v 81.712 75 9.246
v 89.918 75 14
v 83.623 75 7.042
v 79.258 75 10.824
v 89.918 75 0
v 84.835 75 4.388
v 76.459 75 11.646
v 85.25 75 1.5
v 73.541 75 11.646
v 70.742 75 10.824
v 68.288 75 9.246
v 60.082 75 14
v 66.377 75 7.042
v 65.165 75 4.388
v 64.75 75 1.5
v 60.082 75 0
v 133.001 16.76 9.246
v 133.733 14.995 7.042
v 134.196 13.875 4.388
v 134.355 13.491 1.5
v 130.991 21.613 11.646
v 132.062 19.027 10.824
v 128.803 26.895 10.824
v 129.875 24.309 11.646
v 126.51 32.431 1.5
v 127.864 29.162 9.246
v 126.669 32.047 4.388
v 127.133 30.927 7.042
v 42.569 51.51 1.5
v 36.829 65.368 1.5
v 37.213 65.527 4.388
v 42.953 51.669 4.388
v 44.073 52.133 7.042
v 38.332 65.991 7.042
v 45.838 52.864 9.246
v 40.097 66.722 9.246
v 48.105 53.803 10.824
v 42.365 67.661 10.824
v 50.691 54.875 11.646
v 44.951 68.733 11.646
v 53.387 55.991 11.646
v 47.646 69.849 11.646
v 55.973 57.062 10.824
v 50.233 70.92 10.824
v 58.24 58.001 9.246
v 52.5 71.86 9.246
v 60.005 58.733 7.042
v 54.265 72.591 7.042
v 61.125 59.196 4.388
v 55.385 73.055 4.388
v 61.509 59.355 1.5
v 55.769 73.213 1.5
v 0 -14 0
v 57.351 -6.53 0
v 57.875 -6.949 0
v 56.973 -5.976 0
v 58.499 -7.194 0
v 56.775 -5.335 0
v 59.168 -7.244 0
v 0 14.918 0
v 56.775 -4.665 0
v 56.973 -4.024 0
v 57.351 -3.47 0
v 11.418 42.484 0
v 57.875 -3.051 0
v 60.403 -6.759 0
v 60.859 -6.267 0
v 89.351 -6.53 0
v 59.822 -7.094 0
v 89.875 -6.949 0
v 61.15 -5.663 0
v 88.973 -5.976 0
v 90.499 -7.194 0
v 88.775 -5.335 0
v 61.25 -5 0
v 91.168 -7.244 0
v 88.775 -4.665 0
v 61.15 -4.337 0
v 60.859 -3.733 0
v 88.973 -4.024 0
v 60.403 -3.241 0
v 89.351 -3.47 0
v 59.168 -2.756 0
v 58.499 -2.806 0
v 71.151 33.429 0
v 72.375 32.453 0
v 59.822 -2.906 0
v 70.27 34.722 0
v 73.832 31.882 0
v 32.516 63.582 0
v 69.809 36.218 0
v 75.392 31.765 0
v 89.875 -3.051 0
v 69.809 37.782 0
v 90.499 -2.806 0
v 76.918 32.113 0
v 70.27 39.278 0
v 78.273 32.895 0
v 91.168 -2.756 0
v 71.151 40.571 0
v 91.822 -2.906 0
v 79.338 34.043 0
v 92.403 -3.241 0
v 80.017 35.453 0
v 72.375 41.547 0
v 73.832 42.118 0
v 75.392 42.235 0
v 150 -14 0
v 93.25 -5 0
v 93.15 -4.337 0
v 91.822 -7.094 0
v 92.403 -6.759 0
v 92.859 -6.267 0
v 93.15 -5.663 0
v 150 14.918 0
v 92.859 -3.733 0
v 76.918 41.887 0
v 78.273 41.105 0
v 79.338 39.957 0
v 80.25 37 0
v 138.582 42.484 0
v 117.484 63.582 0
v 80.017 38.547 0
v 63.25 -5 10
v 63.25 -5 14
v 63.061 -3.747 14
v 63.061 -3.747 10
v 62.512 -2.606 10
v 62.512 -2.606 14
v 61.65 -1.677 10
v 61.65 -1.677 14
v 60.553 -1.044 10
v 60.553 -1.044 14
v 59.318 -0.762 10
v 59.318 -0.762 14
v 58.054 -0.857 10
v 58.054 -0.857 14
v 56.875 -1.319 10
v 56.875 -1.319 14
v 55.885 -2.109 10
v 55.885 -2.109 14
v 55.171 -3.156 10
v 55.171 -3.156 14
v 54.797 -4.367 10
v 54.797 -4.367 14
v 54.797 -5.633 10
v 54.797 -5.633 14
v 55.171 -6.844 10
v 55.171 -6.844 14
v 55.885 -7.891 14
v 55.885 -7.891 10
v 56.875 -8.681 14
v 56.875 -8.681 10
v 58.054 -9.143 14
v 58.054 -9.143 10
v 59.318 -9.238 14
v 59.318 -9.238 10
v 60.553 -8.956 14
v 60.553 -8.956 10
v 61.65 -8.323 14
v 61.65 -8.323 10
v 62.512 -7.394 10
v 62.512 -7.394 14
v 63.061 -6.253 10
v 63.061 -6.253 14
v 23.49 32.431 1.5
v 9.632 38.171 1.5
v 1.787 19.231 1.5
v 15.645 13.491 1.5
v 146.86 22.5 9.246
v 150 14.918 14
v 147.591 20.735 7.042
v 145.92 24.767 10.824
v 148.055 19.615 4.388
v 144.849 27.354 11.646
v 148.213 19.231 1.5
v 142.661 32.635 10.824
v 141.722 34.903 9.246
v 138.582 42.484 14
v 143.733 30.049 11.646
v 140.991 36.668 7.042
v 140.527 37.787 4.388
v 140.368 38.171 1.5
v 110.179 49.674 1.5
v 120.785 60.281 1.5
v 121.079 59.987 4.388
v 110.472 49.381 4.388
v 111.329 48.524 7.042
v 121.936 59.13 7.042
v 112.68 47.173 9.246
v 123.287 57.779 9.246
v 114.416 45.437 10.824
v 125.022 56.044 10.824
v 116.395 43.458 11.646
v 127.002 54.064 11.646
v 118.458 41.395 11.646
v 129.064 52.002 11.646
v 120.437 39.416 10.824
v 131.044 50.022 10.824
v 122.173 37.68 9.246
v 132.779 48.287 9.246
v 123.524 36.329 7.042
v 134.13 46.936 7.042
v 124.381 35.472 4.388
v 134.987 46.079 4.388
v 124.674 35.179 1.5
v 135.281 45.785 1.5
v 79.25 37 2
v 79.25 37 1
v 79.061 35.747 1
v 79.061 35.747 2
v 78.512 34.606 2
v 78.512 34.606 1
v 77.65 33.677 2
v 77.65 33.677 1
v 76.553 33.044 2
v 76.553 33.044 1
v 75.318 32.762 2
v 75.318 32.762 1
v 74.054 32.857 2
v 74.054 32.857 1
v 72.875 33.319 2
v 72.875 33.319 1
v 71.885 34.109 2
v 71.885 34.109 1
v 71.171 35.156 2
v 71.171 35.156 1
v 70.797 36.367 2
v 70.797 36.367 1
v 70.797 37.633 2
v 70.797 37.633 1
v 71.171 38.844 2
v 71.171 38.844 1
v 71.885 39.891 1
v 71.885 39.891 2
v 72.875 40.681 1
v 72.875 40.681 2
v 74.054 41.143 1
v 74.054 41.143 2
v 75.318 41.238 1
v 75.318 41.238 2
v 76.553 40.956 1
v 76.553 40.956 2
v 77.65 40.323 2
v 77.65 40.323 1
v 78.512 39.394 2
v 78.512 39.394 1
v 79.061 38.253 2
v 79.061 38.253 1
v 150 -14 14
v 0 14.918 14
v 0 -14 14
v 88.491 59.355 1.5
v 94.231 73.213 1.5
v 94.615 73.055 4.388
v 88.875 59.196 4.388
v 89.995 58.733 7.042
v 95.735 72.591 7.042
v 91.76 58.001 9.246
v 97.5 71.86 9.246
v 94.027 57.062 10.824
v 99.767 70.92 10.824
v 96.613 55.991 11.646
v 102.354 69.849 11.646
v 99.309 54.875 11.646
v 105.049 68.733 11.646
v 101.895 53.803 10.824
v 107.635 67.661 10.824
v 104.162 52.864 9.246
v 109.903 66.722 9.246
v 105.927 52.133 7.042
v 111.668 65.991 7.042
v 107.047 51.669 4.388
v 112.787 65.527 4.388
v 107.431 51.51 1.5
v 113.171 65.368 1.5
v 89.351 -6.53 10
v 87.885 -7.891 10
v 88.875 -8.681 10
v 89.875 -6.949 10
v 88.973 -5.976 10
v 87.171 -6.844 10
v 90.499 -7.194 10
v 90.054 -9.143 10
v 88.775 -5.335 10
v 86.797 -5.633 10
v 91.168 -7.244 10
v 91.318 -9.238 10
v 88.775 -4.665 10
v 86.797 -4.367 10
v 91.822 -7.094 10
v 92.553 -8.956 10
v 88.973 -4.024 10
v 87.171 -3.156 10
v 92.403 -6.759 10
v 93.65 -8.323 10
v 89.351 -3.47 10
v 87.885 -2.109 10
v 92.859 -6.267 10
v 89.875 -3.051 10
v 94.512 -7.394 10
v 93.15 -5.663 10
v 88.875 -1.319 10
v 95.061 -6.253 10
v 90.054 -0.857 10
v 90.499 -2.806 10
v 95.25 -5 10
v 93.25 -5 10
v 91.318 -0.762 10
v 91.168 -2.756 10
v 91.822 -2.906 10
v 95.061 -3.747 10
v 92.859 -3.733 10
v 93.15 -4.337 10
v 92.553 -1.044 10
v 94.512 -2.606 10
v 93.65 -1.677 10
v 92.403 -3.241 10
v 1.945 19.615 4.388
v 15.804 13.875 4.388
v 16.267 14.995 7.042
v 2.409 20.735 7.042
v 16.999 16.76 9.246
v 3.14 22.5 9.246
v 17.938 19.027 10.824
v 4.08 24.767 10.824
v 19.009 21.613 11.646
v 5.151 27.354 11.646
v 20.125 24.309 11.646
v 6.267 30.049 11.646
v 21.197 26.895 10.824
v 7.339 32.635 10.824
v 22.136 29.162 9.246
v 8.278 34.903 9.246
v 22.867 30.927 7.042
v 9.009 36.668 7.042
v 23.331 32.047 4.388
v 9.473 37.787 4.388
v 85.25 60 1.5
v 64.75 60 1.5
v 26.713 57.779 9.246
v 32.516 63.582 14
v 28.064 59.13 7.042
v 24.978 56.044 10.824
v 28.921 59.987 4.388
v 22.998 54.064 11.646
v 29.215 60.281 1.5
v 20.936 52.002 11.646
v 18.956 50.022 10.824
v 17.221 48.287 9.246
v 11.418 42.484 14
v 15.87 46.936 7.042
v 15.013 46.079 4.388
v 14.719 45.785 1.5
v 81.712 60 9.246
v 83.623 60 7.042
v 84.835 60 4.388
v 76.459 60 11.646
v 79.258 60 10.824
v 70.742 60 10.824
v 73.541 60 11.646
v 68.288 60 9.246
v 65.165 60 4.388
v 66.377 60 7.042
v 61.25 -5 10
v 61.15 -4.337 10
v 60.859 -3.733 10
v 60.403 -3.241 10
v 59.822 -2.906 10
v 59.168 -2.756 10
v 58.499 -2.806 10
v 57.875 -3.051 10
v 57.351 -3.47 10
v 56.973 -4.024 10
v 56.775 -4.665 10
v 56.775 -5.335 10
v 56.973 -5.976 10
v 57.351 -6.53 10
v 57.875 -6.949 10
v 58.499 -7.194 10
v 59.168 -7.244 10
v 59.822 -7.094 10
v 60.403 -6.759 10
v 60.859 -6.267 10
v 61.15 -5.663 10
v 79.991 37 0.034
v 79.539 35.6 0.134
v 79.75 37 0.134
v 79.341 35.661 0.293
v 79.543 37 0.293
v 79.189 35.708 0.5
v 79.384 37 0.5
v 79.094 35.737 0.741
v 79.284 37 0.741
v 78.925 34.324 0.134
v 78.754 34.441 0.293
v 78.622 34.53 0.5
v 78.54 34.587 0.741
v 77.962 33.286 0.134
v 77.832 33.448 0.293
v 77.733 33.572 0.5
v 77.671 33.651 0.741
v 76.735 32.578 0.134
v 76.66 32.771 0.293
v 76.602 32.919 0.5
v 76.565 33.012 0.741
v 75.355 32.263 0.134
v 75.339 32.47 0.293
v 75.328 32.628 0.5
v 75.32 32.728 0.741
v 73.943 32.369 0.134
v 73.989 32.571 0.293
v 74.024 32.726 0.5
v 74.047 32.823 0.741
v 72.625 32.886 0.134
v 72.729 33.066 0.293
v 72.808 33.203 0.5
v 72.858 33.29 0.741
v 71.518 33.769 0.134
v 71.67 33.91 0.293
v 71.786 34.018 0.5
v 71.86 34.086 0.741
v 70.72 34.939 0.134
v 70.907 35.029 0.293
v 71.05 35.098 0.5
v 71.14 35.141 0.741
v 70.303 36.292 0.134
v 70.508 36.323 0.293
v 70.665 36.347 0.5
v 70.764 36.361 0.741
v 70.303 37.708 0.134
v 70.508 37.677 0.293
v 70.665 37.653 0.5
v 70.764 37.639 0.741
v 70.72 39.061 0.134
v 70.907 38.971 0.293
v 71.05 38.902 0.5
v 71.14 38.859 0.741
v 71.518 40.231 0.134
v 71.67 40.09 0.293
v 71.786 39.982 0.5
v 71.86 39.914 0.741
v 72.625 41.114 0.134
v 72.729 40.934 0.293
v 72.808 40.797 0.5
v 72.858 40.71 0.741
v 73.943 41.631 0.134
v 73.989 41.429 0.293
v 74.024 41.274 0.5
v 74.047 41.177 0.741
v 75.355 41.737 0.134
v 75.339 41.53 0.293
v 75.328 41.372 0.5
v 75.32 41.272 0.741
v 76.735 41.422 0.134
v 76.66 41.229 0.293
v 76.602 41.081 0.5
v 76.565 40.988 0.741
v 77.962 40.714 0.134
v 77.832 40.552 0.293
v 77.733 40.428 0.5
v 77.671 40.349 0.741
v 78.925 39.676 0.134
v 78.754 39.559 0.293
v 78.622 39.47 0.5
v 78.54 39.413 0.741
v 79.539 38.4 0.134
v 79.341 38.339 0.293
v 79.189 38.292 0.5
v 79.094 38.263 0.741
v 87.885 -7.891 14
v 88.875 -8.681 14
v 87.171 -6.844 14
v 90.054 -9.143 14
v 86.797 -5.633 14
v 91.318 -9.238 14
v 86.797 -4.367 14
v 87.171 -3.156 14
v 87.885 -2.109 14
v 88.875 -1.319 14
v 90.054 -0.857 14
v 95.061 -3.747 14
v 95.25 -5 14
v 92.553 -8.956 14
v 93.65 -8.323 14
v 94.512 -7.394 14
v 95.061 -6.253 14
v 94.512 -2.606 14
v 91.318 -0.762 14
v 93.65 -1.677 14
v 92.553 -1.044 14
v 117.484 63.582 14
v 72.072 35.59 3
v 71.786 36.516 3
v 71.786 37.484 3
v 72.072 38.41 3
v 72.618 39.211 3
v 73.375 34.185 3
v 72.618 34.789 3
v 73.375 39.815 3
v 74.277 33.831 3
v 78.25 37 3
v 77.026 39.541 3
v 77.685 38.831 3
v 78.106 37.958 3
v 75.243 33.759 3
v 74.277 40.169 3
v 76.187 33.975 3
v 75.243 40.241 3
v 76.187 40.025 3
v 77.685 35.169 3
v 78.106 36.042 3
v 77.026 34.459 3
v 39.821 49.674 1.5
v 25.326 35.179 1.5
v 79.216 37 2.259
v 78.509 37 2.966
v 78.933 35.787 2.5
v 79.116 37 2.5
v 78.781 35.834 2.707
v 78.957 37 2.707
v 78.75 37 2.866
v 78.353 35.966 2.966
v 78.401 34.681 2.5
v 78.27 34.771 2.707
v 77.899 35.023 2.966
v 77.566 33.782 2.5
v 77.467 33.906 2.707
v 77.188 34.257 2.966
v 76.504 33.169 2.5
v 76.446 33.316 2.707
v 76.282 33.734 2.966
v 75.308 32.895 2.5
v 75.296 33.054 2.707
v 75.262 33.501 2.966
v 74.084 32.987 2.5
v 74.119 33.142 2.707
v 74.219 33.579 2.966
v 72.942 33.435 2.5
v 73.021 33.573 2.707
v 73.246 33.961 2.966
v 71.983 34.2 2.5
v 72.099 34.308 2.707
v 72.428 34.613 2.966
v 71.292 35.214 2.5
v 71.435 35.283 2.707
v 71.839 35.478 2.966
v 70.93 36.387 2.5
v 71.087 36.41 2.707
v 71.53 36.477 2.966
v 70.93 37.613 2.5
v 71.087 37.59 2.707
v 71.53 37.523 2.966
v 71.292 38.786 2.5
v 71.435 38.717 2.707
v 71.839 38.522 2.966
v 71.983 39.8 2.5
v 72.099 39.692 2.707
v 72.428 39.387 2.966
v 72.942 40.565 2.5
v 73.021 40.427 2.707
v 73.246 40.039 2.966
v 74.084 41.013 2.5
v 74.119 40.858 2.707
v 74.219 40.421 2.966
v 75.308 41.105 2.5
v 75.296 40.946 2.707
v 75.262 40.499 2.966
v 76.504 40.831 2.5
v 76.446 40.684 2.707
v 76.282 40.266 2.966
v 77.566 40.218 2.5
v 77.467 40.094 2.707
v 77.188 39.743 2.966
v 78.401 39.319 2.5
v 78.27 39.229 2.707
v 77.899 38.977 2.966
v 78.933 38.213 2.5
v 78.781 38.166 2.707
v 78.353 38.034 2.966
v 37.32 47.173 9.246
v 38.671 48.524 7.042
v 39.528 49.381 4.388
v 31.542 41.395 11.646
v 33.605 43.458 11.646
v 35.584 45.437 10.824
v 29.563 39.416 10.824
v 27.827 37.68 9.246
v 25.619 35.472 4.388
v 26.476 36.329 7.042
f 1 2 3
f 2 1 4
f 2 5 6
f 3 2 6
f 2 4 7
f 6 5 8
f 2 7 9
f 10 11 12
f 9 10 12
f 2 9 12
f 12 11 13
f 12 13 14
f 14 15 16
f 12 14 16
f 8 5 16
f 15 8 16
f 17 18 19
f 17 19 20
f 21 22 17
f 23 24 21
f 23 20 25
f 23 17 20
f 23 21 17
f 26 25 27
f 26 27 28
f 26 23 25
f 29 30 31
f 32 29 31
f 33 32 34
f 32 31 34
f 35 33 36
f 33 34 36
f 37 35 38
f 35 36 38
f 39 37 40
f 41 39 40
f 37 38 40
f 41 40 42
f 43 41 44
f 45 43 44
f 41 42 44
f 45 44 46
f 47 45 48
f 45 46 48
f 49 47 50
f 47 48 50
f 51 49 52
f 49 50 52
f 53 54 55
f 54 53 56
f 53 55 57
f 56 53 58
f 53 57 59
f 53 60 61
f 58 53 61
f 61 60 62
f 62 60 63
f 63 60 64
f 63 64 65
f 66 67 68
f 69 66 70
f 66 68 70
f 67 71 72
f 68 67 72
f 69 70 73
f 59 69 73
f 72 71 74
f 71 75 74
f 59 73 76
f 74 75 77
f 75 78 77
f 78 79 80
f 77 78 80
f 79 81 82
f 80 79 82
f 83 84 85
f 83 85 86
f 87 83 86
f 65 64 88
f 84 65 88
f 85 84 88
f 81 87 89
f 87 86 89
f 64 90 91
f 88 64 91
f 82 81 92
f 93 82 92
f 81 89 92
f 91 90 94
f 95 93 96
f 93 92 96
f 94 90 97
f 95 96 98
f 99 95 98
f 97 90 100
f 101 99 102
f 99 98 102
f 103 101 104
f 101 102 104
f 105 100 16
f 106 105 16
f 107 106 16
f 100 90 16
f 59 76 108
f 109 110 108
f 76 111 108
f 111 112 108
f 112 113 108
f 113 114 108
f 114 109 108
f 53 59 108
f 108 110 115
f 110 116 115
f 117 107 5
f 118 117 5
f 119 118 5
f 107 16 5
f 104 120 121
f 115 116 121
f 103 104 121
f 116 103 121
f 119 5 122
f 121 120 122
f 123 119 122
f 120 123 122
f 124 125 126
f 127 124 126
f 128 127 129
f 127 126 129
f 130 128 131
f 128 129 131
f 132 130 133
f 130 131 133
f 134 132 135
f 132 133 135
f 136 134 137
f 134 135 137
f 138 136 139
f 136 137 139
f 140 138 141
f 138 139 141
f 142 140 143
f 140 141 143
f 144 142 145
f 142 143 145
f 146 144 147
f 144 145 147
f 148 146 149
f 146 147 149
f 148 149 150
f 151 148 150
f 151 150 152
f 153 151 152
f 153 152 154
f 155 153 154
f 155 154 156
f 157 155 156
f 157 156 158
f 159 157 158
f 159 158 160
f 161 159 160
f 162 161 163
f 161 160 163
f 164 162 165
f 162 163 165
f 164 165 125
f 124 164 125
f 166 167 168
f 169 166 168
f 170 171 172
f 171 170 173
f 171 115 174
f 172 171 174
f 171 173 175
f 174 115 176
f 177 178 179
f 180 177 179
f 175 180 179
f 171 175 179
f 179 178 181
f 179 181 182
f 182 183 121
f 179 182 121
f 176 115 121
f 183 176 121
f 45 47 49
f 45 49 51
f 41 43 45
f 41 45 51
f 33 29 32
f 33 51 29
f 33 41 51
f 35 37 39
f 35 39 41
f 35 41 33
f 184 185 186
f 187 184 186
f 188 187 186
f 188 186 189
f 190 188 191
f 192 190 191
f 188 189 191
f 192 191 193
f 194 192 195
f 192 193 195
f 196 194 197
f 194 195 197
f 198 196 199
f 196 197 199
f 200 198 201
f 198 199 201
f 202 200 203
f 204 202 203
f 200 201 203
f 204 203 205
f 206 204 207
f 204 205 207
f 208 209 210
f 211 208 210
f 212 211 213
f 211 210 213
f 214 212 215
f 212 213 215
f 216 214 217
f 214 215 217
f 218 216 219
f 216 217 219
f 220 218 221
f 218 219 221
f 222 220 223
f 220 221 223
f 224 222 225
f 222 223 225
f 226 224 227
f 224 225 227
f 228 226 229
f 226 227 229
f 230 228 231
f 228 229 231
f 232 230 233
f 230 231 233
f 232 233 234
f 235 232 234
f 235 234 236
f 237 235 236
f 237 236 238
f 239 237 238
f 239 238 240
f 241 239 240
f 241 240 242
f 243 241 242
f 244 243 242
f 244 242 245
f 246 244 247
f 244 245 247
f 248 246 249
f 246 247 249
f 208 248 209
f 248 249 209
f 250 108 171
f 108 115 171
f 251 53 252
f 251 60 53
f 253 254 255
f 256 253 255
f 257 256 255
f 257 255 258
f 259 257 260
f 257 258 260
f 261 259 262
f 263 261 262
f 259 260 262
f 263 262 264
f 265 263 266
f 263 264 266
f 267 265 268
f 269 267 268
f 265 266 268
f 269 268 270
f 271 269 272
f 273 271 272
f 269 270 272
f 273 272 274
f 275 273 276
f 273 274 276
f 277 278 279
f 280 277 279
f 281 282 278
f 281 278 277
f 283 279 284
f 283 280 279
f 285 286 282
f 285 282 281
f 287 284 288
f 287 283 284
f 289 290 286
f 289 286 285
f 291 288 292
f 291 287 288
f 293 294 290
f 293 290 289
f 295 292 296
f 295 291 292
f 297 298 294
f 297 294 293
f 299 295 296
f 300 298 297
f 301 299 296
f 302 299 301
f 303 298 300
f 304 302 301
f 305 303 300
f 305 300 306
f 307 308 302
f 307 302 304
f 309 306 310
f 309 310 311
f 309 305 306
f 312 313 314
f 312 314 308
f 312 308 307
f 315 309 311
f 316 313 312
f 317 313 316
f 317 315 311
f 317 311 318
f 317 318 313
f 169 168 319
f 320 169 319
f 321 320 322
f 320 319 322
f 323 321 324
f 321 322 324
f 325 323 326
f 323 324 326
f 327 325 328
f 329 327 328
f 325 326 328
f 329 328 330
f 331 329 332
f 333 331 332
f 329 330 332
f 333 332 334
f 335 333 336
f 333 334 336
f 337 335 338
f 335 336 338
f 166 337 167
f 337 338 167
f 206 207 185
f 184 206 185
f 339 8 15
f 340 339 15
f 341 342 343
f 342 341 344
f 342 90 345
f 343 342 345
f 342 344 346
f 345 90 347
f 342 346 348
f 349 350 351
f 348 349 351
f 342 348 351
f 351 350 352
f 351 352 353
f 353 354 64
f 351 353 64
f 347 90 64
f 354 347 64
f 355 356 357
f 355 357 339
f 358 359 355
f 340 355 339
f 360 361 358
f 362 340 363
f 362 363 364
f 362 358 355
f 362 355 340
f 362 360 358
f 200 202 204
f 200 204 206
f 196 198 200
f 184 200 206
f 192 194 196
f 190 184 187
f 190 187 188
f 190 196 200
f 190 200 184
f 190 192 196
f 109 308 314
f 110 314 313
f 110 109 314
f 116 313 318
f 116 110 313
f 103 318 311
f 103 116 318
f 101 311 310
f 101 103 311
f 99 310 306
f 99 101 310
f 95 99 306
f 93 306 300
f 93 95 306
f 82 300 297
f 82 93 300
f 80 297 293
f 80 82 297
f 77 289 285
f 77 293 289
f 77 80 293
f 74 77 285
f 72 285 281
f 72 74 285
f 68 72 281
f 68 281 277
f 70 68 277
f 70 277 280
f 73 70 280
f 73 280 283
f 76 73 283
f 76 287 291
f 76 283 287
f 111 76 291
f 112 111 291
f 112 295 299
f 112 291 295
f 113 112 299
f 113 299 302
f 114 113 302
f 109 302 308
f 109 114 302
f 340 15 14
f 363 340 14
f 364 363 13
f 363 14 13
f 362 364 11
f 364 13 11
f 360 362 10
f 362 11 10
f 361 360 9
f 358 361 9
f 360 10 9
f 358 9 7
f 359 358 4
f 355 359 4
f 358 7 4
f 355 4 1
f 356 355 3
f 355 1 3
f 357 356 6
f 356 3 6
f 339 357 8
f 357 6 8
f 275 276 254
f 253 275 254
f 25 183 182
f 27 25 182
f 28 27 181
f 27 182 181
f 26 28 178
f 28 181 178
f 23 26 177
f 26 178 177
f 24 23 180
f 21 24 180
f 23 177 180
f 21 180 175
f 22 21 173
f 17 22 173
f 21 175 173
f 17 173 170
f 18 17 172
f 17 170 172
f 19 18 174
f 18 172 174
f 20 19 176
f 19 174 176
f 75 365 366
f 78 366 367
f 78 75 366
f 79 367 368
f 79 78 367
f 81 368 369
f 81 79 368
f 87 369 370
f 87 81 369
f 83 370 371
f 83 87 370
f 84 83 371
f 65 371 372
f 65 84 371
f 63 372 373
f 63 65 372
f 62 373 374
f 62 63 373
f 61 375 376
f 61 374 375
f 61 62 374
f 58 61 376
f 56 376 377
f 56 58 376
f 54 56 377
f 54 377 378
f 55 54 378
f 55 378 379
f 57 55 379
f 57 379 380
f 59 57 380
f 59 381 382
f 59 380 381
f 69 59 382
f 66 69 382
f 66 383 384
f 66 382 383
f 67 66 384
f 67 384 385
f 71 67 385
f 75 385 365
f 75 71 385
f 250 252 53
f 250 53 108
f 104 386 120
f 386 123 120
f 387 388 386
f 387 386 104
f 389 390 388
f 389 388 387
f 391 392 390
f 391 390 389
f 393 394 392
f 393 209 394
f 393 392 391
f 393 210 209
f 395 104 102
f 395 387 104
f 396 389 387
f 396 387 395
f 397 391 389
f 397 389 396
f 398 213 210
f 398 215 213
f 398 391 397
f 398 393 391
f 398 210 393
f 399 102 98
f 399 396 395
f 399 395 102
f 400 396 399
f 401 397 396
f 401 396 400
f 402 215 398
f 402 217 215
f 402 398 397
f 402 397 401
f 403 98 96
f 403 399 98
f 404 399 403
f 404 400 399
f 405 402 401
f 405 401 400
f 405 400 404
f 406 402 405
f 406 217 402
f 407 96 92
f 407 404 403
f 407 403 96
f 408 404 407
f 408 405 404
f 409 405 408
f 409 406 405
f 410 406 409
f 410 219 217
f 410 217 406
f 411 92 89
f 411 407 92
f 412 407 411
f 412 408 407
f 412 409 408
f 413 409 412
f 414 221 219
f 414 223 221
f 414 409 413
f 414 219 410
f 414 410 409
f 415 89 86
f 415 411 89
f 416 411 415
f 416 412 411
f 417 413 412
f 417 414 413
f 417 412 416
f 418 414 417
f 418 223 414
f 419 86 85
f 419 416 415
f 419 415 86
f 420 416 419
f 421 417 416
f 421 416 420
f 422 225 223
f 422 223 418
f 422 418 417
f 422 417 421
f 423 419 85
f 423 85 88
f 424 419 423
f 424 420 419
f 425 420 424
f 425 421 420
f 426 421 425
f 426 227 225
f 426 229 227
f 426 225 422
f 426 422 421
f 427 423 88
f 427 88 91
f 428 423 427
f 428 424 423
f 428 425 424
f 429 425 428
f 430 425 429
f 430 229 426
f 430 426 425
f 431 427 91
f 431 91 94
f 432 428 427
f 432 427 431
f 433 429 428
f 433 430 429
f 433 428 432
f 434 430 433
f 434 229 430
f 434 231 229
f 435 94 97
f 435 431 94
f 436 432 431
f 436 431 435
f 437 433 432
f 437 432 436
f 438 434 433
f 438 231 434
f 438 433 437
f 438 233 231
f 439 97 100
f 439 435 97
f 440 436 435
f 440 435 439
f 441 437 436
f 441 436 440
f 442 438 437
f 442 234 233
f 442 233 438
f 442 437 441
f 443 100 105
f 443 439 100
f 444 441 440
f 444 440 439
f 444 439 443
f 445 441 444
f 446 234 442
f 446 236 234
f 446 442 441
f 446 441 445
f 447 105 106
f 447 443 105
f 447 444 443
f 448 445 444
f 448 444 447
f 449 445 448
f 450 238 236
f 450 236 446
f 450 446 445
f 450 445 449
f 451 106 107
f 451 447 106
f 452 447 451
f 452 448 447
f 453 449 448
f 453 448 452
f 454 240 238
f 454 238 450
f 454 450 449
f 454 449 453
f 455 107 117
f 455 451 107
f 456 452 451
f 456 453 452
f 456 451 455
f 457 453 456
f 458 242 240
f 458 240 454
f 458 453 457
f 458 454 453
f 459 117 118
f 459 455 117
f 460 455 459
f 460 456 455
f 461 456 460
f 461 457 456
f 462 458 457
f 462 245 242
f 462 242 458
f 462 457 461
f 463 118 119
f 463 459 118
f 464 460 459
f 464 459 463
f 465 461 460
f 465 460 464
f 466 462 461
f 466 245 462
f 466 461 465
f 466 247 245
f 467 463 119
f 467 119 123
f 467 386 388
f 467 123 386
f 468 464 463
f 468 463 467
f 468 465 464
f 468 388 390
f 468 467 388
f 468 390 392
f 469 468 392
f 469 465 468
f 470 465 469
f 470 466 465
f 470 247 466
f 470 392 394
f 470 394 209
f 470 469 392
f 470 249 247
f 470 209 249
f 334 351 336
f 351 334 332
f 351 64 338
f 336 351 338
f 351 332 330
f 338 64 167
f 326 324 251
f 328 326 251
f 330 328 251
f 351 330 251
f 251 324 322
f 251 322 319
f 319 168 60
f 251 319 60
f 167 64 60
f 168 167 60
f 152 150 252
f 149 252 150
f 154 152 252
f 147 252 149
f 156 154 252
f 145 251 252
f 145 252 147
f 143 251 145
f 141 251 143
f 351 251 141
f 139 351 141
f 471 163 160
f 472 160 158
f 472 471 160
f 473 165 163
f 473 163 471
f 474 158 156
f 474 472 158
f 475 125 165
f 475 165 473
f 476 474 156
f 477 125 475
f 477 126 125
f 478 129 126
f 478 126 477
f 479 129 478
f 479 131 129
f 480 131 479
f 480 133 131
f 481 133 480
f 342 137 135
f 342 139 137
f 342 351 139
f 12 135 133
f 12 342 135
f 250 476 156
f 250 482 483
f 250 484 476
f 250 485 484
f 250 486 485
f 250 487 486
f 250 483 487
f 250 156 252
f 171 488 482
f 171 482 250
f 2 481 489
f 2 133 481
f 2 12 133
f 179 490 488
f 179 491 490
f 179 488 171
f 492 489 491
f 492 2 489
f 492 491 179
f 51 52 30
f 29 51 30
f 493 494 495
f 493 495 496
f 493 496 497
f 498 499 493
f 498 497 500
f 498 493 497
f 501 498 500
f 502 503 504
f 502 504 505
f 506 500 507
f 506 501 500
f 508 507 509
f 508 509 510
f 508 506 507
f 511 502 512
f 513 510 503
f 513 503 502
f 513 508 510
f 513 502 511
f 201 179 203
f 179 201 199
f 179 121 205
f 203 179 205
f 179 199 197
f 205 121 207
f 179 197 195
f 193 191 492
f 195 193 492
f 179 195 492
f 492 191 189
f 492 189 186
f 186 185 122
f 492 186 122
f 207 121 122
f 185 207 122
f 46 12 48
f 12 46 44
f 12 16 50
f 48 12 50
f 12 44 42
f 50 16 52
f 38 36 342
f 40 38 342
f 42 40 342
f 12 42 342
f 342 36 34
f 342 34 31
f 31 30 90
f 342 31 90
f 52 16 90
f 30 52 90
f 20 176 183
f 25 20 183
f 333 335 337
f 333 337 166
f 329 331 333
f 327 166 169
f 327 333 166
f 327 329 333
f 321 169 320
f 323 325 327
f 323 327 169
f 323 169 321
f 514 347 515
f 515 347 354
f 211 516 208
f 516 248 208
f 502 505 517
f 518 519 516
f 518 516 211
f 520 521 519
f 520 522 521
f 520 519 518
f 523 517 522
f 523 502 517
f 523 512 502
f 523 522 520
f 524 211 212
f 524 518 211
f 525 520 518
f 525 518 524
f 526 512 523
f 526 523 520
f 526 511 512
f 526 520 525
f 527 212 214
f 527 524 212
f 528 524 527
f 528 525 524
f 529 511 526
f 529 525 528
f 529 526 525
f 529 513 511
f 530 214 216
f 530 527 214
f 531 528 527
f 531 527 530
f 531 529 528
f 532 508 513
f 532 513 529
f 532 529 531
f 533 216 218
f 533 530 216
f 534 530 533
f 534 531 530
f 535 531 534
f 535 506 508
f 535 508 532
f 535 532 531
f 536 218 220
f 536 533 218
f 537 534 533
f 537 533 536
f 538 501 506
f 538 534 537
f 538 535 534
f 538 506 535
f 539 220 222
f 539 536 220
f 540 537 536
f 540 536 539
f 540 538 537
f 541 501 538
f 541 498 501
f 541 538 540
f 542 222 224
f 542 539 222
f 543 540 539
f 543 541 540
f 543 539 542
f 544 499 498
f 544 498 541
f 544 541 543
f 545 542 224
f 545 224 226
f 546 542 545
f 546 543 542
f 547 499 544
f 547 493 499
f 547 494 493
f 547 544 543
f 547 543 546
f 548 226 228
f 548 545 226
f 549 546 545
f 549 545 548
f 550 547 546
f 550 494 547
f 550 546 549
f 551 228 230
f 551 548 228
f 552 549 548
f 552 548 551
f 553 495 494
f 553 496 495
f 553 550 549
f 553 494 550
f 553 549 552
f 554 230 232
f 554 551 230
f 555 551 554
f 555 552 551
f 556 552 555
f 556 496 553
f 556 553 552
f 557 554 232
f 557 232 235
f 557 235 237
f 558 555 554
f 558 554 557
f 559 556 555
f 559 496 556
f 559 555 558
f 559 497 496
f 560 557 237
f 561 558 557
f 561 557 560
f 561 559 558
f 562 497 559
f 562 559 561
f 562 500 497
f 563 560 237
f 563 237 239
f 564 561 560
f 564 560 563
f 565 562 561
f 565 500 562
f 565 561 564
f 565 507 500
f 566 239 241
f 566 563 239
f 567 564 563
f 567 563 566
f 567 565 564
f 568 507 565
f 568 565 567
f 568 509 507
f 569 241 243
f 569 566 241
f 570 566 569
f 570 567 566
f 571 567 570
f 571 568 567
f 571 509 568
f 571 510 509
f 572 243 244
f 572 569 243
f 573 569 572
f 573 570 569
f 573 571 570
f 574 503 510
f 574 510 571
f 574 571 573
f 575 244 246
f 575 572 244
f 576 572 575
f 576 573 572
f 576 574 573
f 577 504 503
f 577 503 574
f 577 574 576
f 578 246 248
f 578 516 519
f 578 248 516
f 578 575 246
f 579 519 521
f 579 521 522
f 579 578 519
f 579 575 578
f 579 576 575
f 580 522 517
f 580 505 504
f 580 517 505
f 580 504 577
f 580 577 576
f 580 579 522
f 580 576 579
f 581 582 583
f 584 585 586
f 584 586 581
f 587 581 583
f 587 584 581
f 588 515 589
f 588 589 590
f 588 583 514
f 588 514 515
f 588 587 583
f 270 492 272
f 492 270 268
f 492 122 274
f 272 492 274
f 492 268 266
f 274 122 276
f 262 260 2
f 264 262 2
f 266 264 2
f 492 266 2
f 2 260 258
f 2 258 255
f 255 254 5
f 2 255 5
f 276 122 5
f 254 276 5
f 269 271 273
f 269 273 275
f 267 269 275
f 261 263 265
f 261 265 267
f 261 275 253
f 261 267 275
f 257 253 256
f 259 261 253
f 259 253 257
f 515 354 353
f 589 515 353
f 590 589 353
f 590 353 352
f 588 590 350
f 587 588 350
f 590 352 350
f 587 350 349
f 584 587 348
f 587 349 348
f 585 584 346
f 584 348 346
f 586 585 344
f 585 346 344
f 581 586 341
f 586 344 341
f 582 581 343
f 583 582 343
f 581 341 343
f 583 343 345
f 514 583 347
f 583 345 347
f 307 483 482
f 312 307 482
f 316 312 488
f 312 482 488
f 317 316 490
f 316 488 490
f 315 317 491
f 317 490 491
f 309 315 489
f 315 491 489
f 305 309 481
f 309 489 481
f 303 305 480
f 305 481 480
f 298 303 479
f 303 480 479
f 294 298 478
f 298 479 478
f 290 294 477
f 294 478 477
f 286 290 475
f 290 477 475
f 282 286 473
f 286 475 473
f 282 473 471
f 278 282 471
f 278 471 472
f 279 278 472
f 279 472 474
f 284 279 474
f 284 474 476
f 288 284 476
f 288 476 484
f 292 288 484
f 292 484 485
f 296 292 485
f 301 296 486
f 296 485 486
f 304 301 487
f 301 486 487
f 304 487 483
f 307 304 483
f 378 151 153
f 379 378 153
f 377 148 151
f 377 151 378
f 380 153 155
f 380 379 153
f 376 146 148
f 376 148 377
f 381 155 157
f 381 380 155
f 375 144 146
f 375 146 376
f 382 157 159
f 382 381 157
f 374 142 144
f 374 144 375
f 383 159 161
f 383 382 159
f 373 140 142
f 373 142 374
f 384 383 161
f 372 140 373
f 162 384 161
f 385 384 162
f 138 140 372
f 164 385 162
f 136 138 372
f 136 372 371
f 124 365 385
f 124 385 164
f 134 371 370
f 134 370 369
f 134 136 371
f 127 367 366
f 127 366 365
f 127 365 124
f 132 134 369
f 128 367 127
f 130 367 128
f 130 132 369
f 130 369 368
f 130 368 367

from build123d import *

# Parameters (mm, degrees)
F0_W      = 150
F0_H      = 10
F0_R      = 2.25
F1_DEPTH  = 14
F5_DEPTH  = 15
F6_DEPTH  = 15
F7_DEPTH  = 15
F8_R      = 4.25
F9_DEPTH  = 4
F10_W     = 150
F10_H     = 14
F11_DEPTH = 4
F12_R     = 4.25
F13_DEPTH = 3
F14_R     = 1
F17_DEPTH = 15
F18_DEPTH = 15
F21_DEPTH = 15
F22_DEPTH = 15


with BuildPart() as f1:
    # F0 (on Top) → F1 (new body)
    with BuildSketch(Plane.XY):
        Polygon((0, 14.9184275535), (0, 0), (150, 0), (150, 14.9184275535), (138.5819298767, 42.4840873013), (117.4840873013, 63.5819298767), (89.9184275535, 75), (60.0815724465, 75), (32.5159126987, 63.5819298767), (11.4180701233, 42.4840873013), align=None)
        with Locations((75, -5)):
            Rectangle(F0_W, F0_H)
        with Locations((59, -5)):
            Circle(F0_R, mode=Mode.SUBTRACT)
        with Locations((91, -5)):
            Circle(F0_R, mode=Mode.SUBTRACT)
    extrude(amount=F1_DEPTH)

    # F4 (on face) → F5 (cut)
    with BuildSketch(Plane(origin=(90.533008589, 90.533008589, 0), x_dir=(-0.7071067812, 0.7071067812, 0), z_dir=(0.7071067812, 0.7071067812, 0))):
        with BuildLine():
            ThreePointArc((-42.783008589, 1.5), (-53.033008589, 11.75), (-63.283008589, 1.5))
            Line((-63.283008589, 1.5), (-42.783008589, 1.5))
        make_face()
    extrude(amount=-F5_DEPTH, mode=Mode.SUBTRACT)

    # F2 (on face) → F6 (cut)
    with BuildSketch(Plane(origin=(0, 75, 0), x_dir=(-1, 0, 0), z_dir=(0, 1, 0))):
        with BuildLine():
            ThreePointArc((-64.75, 1.5), (-75, 11.75), (-85.25, 1.5))
            Line((-85.25, 1.5), (-64.75, 1.5))
        make_face()
    extrude(amount=-F6_DEPTH, mode=Mode.SUBTRACT)

    # F3 (on face) → F7 (cut)
    with BuildSketch(Plane(origin=(-15.533008589, 15.533008589, 0), x_dir=(-0.7071067812, -0.7071067812, 0), z_dir=(-0.7071067812, 0.7071067812, 0))):
        with BuildLine():
            ThreePointArc((-42.783008589, 1.5), (-53.033008589, 11.75), (-63.283008589, 1.5))
            Line((-63.283008589, 1.5), (-42.783008589, 1.5))
        make_face()
    extrude(amount=-F7_DEPTH, mode=Mode.SUBTRACT)

    # F8 (on face) → F9 (cut)
    with BuildSketch(Plane.XY.offset(14)):
        with Locations((59, -5)):
            Circle(F8_R)
        with Locations((91, -5)):
            Circle(F8_R)
    extrude(amount=-F9_DEPTH, mode=Mode.SUBTRACT)

    # F10 (on face) → F11 (join)
    with BuildSketch(Plane.XZ.offset(10)):
        with Locations((75, 7)):
            Rectangle(F10_W, F10_H)
    extrude(amount=F11_DEPTH)

    # F12 (on face) → F13 (cut)
    with BuildSketch(Plane(origin=(0, 0, 0), x_dir=(1, 0, 0), z_dir=(0, 0, -1))):
        with Locations((75, -37)):
            Circle(F12_R)
    extrude(amount=-F13_DEPTH, mode=Mode.SUBTRACT)

    # F14
    f14_edges = [f1.edges().sort_by_distance(p)[0] for p in [
        (70.75, 37, 0),
        (70.75, 37, 3),
    ]]
    fillet(f14_edges, radius=F14_R)

    # F16 (on face) → F17 (cut)
    with BuildSketch(Plane(origin=(133.3074692328, 55.2177617219, 0), x_dir=(-0.3826834324, 0.9238795325, 0), z_dir=(0.9238795325, 0.3826834324, 0))):
        with BuildLine():
            ThreePointArc((-18.4512574274, 1.5), (-28.7012574274, 11.75), (-38.9512574274, 1.5))
            Line((-38.9512574274, 1.5), (-18.4512574274, 1.5))
        make_face()
    extrude(amount=-F17_DEPTH, mode=Mode.SUBTRACT)

    # F15 (on face) → F18 (cut)
    with BuildSketch(Plane(origin=(-5.2744606439, 2.1847531329, 0), x_dir=(-0.3826834324, -0.9238795325, 0), z_dir=(-0.9238795325, 0.3826834324, 0))):
        with BuildLine():
            ThreePointArc((-18.4512574274, 1.5), (-28.7012574274, 11.75), (-38.9512574274, 1.5))
            Line((-38.9512574274, 1.5), (-18.4512574274, 1.5))
        make_face()
    extrude(amount=-F18_DEPTH, mode=Mode.SUBTRACT)

    # F20 (on face) → F21 (cut)
    with BuildSketch(Plane(origin=(-17.7177617219, 42.7744606439, 0), x_dir=(-0.9238795325, -0.3826834324, 0), z_dir=(-0.3826834324, 0.9238795325, 0))):
        with BuildLine():
            ThreePointArc((-59.0409649383, 1.5), (-69.2909649383, 11.75), (-79.5409649383, 1.5))
            Line((-79.5409649383, 1.5), (-59.0409649383, 1.5))
        make_face()
    extrude(amount=-F21_DEPTH, mode=Mode.SUBTRACT)

    # F19 (on face) → F22 (cut)
    with BuildSketch(Plane(origin=(39.6847531329, 95.8074692328, 0), x_dir=(-0.9238795325, 0.3826834324, 0), z_dir=(0.3826834324, 0.9238795325, 0))):
        with BuildLine():
            ThreePointArc((-59.0409649383, 1.5), (-69.2909649383, 11.75), (-79.5409649383, 1.5))
            Line((-79.5409649383, 1.5), (-59.0409649383, 1.5))
        make_face()
    extrude(amount=-F22_DEPTH, mode=Mode.SUBTRACT)


solid = f1.part
